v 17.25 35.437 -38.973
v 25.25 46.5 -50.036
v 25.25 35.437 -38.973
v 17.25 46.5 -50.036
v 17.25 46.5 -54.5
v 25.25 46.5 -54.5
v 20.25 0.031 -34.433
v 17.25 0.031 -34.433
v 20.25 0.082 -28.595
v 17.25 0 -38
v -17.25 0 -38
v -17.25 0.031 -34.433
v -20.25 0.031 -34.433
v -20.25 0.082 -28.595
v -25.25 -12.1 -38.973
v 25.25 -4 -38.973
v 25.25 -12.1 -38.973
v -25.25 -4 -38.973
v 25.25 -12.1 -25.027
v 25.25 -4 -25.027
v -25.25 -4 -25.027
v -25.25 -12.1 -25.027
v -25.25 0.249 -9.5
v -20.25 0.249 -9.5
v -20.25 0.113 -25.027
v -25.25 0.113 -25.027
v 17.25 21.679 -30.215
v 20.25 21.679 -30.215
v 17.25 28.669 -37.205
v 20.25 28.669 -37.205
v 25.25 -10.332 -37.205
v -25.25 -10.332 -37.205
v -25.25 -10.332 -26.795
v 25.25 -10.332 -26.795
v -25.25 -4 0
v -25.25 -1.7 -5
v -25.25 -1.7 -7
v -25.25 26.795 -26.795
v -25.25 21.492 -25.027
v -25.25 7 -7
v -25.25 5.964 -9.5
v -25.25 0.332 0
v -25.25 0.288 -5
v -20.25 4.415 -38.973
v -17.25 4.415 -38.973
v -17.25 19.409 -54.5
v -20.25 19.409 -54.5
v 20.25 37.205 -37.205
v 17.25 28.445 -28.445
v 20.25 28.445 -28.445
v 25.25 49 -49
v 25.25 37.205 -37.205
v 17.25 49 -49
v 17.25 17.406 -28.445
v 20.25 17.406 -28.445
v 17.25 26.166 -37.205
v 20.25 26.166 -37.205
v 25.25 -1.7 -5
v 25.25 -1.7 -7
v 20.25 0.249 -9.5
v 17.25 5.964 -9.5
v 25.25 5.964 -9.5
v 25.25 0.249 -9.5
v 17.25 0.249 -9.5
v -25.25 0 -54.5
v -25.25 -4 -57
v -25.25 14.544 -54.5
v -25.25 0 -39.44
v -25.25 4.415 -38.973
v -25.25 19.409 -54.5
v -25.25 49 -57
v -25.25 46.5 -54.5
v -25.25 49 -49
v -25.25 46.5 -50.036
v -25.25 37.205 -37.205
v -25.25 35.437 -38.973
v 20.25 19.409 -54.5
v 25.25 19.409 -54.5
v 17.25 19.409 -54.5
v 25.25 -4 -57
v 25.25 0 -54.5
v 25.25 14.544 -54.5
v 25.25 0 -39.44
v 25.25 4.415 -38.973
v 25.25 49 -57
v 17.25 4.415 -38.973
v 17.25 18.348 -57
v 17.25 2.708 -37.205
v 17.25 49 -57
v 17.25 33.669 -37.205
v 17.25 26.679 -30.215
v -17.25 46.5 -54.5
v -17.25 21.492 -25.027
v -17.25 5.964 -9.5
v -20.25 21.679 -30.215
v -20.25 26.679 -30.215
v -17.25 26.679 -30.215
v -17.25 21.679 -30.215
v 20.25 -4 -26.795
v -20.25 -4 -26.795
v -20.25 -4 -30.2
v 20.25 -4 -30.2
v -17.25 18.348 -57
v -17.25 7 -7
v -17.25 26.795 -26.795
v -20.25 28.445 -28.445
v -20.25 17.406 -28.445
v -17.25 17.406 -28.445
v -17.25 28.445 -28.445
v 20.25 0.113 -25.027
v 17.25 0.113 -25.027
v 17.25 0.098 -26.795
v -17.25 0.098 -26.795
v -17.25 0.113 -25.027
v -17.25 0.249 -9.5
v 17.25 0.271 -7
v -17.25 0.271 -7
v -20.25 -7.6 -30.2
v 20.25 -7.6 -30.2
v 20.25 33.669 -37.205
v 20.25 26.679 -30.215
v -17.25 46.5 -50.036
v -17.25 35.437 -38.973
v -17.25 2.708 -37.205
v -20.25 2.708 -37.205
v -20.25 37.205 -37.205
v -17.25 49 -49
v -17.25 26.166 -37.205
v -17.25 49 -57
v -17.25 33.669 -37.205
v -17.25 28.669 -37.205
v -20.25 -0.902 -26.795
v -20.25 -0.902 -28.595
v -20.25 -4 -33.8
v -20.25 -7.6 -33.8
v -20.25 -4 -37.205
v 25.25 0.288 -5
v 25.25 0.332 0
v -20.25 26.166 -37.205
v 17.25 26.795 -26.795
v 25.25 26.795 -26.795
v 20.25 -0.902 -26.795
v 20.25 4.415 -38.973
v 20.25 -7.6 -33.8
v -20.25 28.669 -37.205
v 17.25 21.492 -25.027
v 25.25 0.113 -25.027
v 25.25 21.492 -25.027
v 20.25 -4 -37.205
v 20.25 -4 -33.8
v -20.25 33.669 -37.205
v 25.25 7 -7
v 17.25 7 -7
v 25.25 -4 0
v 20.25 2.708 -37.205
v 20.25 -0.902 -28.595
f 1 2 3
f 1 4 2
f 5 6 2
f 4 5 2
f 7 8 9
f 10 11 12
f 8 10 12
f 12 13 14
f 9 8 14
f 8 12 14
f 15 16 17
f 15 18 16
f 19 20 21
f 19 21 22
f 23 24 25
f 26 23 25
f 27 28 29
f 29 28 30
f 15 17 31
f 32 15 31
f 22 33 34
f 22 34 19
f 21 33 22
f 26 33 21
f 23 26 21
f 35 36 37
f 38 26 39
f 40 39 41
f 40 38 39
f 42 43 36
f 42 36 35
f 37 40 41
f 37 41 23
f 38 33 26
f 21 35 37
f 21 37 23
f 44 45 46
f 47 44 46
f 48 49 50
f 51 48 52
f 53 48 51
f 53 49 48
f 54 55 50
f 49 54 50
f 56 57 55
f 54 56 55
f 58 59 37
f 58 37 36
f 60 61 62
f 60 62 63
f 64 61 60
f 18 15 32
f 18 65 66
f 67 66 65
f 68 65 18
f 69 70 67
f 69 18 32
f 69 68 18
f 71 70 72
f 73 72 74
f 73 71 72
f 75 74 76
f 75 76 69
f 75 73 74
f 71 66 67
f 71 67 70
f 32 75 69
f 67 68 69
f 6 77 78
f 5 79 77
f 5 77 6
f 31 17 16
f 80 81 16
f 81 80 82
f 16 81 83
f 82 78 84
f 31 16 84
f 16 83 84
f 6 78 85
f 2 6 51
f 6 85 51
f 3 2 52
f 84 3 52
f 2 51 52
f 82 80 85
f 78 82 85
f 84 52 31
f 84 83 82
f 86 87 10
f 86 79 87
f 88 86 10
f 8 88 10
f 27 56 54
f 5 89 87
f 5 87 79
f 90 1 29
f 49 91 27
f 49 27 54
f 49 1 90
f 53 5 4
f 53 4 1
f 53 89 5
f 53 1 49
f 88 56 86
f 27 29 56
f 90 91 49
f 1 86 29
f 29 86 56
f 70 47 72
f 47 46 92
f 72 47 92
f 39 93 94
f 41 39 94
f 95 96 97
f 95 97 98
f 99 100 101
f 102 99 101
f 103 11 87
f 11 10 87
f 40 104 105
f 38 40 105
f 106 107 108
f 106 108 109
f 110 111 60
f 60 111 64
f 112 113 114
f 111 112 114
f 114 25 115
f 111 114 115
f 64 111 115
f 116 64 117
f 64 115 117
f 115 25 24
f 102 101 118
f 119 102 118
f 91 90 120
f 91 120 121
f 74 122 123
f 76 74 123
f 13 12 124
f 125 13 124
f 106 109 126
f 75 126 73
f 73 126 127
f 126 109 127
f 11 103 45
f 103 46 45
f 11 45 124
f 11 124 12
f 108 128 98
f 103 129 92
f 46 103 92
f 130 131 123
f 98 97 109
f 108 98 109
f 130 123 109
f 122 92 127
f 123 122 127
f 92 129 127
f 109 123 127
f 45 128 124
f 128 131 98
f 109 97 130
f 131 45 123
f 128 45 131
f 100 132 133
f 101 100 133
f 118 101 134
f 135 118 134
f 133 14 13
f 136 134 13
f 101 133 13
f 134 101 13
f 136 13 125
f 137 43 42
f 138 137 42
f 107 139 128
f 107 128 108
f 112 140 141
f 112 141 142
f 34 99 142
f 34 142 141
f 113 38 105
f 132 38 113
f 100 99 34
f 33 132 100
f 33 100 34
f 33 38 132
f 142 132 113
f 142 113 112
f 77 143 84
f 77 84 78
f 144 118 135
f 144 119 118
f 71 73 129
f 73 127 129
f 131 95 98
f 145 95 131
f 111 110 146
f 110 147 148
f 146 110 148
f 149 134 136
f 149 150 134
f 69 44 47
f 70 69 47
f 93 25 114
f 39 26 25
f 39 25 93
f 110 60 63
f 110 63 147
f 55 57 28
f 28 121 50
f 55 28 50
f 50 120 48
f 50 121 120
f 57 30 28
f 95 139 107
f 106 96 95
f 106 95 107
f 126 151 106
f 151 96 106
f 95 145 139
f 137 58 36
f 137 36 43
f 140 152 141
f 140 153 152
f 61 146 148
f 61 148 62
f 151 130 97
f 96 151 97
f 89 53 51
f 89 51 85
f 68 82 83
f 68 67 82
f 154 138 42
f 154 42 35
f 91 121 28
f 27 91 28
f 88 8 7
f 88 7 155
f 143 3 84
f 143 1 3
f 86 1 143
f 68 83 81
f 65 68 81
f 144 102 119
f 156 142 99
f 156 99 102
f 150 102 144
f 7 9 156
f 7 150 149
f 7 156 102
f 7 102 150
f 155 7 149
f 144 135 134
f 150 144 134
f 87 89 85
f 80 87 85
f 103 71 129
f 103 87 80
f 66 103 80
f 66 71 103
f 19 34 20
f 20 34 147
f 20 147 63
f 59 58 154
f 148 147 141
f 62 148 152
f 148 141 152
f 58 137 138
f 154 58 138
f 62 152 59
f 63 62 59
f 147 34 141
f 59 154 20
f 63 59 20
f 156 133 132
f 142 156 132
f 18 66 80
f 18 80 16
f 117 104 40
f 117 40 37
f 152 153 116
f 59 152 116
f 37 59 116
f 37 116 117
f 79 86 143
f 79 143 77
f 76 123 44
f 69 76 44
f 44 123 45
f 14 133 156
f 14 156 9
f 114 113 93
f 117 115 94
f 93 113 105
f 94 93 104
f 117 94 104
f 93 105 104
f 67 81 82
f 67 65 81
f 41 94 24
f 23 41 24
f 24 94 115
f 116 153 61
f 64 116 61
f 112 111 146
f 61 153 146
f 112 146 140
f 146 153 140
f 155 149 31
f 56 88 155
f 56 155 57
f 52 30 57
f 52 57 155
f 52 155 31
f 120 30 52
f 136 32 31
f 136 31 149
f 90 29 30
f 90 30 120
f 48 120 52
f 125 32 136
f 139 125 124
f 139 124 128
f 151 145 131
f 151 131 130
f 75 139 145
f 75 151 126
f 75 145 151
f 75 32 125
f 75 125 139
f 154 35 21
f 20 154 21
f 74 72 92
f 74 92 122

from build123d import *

# Parameters (mm, degrees)
BOSS_EXTRUDE1_DEPTH = 17.25
BOSS_EXTRUDE2_DEPTH = 3
BOSS_EXTRUDE3_START = -20.25
BOSS_EXTRUDE3_DEPTH = 40.5
BOSS_EXTRUDE5_DEPTH = 3
BOSS_EXTRUDE6_DEPTH = 5
SKETCH9_W           = 1.8
SKETCH9_H           = 1
CUT_EXTRUDE2_DEPTH  = 20.25
BOSS_EXTRUDE7_DEPTH = 3


with BuildPart() as part:
    # Sketch1 → Boss-Extrude1 (new body)
    # profile 1 of 3: a face of its own
    with BuildSketch(Plane(origin=(0, 0, 0), x_dir=(0, 0, -1), z_dir=(1, 0, 0))):
        Polygon((0, 0), (5, 0), (5, -1.7), (7, -1.7), (7, 0), (38, 0), (57, 18.348086721), (57, -4), (33.8, -4), (33.8, -7.6), (30.2, -7.6), (30.2, -4), (0, -4), align=None)
        Polygon((54.5, 14.543701193), (39.43955654, 0), (54.5, 0), align=None, mode=Mode.SUBTRACT)
    # profile 2 of 3: a face of its own
    with BuildSketch(Plane(origin=(0, 0, 0), x_dir=(0, 0, -1), z_dir=(1, 0, 0))):
        Polygon((26.795, -4), (26.795, -10.332233047), (25.027233047, -12.1), (25.027233047, -4), align=None)
    # profile 3 of 3: a face of its own
    with BuildSketch(Plane(origin=(0, 0, 0), x_dir=(0, 0, -1), z_dir=(1, 0, 0))):
        Polygon((37.205, -4), (37.205, -10.332233047), (38.972766953, -12.1), (38.972766953, -4), align=None)
    boss_extrude1 = extrude(amount=BOSS_EXTRUDE1_DEPTH)

    # Sketch3 → Boss-Extrude2 (add)
    with BuildSketch(Plane(origin=(17.25, 0, 0), x_dir=(0, 0, -1), z_dir=(1, 0, 0))):
        Polygon((57, -4), (57, 49), (49, 49), (7, 7), (7, -1.7), (5, -1.7), (5, 0), (0, 0), (0, -4), (25.027233047, -4), (25.027233047, -12.1), (26.795, -10.332233047), (26.795, -4), (30.2, -4), (30.2, -7.6), (33.8, -7.6), (33.8, -4), (37.205, -4), (37.205, -10.332233047), (38.972766953, -12.1), (38.972766953, -4), align=None)
        Polygon((9.5, 5.964466094), (9.5, 0), (34.401108651, 0), (54.5, 19.409273762), (54.5, 46.5), (50.035533906, 46.5), align=None, mode=Mode.SUBTRACT)
        Polygon((39.43955654, 0), (54.5, 0), (54.5, 14.543701193), align=None, mode=Mode.SUBTRACT)
    boss_extrude2 = extrude(amount=BOSS_EXTRUDE2_DEPTH)

    # Mirror1: Boss-Extrude1, Boss-Extrude2 across plane
    add(boss_extrude1.mirror(Plane(origin=(0, 0, 0), x_dir=(0, 0, 1), z_dir=(1, 0, 0))))
    add(boss_extrude2.mirror(Plane(origin=(0, 0, 0), x_dir=(0, 0, 1), z_dir=(1, 0, 0))))

    # Sketch1<3> → Boss-Extrude3 (add)
    with BuildSketch(Plane(origin=(0, 0, 0), x_dir=(0, 0, -1), z_dir=(1, 0, 0)).offset(BOSS_EXTRUDE3_START)):
        Polygon((38, 0), (7, 0.270532902), (7, 0), align=None)
        Polygon((5, 0.287986637), (0, 0.331620976), (0, 0), (5, 0), align=None)
    extrude(amount=BOSS_EXTRUDE3_DEPTH)

    # Sketch6 → Boss-Extrude5 (add)
    with BuildSketch(Plane.ZY.offset(20.25)):
        Polygon((-37.205, 2.707686402), (-37.205, 33.669466094), (-38.972766953, 35.437233047), (-38.972766953, 4.414799105), align=None)
        Polygon((-26.795, 0.097784554), (-25.027233047, 0.113211622), (-25.027233047, 21.491699141), (-26.795, 23.259466094), align=None)
    boss_extrude5 = extrude(amount=-BOSS_EXTRUDE5_DEPTH)

    # Sketch8 → Boss-Extrude6 (add)
    # profile 1 of 2: a face of its own
    with BuildSketch(Plane.ZY.offset(20.25)):
        Polygon((-37.205, 33.669466094), (-37.205, 37.205), (-49, 49), (-57, 49), (-57, -4), (-38.972766953, -4), (-38.972766953, -12.1), (-37.205, -10.332233047), (-37.205, -4), (-37.205, 2.707686402), align=None)
        Polygon((-39.43955654, 0), (-54.5, 0), (-54.5, 14.543701193), align=None, mode=Mode.SUBTRACT)
        Polygon((-54.5, 19.409273762), (-54.5, 46.5), (-50.035533906, 46.5), (-38.972766953, 35.437233047), (-38.972766953, 4.414799105), align=None, mode=Mode.SUBTRACT)
    # profile 2 of 2: a face of its own
    with BuildSketch(Plane.ZY.offset(20.25)):
        Polygon((-5, 0.287986637), (-5, -1.7), (-7, -1.7), (-7, 7), (-26.795, 26.795), (-26.795, 23.259466094), (-26.795, 0.097784554), (-26.795, -4), (-26.795, -10.332233047), (-25.027233047, -12.1), (-25.027233047, -4), (0, -4), (0, 0.331620976), align=None)
        Polygon((-25.027233047, 0.113211622), (-25.027233047, 21.491699141), (-9.5, 5.964466094), (-9.5, 0.248715732), align=None, mode=Mode.SUBTRACT)
    boss_extrude6 = extrude(amount=BOSS_EXTRUDE6_DEPTH)

    # Sketch9 → Cut-Extrude2 (cut)
    with BuildSketch(Plane.ZY.offset(20.25)):
        Polygon((-28.445, 17.406308089), (-28.445, 24.909466094), (-30.215, 26.679466094), (-30.215, 21.679466094), (-37.205, 28.669466094), (-37.205, 26.166308089), align=None)
        Polygon((-26.795, 23.259466094), (-26.795, 26.795), (-28.445, 28.445), (-28.445, 24.909466094), align=None)
        with Locations((-27.695, -0.402215446)):
            Rectangle(SKETCH9_W, SKETCH9_H)
    cut_extrude2 = extrude(amount=-CUT_EXTRUDE2_DEPTH, mode=Mode.SUBTRACT)

    # Sketch9<3> → Boss-Extrude7 (add)
    with BuildSketch(Plane.ZY.offset(20.25)):
        Polygon((-28.445, 17.406308089), (-28.445, 24.909466094), (-30.215, 26.679466094), (-30.215, 21.679466094), (-37.205, 28.669466094), (-37.205, 26.166308089), align=None)
    boss_extrude7 = extrude(amount=-BOSS_EXTRUDE7_DEPTH)

    # Mirror2: Boss-Extrude5, Boss-Extrude6, Cut-Extrude2, Boss-Extrude7 across plane
    add(boss_extrude5.mirror(Plane(origin=(0, 0, 0), x_dir=(0, 0, 1), z_dir=(1, 0, 0))))
    add(boss_extrude6.mirror(Plane(origin=(0, 0, 0), x_dir=(0, 0, 1), z_dir=(1, 0, 0))))
    add(cut_extrude2.mirror(Plane(origin=(0, 0, 0), x_dir=(0, 0, 1), z_dir=(1, 0, 0))), mode=Mode.SUBTRACT)
    add(boss_extrude7.mirror(Plane(origin=(0, 0, 0), x_dir=(0, 0, 1), z_dir=(1, 0, 0))))


solid = part.part
